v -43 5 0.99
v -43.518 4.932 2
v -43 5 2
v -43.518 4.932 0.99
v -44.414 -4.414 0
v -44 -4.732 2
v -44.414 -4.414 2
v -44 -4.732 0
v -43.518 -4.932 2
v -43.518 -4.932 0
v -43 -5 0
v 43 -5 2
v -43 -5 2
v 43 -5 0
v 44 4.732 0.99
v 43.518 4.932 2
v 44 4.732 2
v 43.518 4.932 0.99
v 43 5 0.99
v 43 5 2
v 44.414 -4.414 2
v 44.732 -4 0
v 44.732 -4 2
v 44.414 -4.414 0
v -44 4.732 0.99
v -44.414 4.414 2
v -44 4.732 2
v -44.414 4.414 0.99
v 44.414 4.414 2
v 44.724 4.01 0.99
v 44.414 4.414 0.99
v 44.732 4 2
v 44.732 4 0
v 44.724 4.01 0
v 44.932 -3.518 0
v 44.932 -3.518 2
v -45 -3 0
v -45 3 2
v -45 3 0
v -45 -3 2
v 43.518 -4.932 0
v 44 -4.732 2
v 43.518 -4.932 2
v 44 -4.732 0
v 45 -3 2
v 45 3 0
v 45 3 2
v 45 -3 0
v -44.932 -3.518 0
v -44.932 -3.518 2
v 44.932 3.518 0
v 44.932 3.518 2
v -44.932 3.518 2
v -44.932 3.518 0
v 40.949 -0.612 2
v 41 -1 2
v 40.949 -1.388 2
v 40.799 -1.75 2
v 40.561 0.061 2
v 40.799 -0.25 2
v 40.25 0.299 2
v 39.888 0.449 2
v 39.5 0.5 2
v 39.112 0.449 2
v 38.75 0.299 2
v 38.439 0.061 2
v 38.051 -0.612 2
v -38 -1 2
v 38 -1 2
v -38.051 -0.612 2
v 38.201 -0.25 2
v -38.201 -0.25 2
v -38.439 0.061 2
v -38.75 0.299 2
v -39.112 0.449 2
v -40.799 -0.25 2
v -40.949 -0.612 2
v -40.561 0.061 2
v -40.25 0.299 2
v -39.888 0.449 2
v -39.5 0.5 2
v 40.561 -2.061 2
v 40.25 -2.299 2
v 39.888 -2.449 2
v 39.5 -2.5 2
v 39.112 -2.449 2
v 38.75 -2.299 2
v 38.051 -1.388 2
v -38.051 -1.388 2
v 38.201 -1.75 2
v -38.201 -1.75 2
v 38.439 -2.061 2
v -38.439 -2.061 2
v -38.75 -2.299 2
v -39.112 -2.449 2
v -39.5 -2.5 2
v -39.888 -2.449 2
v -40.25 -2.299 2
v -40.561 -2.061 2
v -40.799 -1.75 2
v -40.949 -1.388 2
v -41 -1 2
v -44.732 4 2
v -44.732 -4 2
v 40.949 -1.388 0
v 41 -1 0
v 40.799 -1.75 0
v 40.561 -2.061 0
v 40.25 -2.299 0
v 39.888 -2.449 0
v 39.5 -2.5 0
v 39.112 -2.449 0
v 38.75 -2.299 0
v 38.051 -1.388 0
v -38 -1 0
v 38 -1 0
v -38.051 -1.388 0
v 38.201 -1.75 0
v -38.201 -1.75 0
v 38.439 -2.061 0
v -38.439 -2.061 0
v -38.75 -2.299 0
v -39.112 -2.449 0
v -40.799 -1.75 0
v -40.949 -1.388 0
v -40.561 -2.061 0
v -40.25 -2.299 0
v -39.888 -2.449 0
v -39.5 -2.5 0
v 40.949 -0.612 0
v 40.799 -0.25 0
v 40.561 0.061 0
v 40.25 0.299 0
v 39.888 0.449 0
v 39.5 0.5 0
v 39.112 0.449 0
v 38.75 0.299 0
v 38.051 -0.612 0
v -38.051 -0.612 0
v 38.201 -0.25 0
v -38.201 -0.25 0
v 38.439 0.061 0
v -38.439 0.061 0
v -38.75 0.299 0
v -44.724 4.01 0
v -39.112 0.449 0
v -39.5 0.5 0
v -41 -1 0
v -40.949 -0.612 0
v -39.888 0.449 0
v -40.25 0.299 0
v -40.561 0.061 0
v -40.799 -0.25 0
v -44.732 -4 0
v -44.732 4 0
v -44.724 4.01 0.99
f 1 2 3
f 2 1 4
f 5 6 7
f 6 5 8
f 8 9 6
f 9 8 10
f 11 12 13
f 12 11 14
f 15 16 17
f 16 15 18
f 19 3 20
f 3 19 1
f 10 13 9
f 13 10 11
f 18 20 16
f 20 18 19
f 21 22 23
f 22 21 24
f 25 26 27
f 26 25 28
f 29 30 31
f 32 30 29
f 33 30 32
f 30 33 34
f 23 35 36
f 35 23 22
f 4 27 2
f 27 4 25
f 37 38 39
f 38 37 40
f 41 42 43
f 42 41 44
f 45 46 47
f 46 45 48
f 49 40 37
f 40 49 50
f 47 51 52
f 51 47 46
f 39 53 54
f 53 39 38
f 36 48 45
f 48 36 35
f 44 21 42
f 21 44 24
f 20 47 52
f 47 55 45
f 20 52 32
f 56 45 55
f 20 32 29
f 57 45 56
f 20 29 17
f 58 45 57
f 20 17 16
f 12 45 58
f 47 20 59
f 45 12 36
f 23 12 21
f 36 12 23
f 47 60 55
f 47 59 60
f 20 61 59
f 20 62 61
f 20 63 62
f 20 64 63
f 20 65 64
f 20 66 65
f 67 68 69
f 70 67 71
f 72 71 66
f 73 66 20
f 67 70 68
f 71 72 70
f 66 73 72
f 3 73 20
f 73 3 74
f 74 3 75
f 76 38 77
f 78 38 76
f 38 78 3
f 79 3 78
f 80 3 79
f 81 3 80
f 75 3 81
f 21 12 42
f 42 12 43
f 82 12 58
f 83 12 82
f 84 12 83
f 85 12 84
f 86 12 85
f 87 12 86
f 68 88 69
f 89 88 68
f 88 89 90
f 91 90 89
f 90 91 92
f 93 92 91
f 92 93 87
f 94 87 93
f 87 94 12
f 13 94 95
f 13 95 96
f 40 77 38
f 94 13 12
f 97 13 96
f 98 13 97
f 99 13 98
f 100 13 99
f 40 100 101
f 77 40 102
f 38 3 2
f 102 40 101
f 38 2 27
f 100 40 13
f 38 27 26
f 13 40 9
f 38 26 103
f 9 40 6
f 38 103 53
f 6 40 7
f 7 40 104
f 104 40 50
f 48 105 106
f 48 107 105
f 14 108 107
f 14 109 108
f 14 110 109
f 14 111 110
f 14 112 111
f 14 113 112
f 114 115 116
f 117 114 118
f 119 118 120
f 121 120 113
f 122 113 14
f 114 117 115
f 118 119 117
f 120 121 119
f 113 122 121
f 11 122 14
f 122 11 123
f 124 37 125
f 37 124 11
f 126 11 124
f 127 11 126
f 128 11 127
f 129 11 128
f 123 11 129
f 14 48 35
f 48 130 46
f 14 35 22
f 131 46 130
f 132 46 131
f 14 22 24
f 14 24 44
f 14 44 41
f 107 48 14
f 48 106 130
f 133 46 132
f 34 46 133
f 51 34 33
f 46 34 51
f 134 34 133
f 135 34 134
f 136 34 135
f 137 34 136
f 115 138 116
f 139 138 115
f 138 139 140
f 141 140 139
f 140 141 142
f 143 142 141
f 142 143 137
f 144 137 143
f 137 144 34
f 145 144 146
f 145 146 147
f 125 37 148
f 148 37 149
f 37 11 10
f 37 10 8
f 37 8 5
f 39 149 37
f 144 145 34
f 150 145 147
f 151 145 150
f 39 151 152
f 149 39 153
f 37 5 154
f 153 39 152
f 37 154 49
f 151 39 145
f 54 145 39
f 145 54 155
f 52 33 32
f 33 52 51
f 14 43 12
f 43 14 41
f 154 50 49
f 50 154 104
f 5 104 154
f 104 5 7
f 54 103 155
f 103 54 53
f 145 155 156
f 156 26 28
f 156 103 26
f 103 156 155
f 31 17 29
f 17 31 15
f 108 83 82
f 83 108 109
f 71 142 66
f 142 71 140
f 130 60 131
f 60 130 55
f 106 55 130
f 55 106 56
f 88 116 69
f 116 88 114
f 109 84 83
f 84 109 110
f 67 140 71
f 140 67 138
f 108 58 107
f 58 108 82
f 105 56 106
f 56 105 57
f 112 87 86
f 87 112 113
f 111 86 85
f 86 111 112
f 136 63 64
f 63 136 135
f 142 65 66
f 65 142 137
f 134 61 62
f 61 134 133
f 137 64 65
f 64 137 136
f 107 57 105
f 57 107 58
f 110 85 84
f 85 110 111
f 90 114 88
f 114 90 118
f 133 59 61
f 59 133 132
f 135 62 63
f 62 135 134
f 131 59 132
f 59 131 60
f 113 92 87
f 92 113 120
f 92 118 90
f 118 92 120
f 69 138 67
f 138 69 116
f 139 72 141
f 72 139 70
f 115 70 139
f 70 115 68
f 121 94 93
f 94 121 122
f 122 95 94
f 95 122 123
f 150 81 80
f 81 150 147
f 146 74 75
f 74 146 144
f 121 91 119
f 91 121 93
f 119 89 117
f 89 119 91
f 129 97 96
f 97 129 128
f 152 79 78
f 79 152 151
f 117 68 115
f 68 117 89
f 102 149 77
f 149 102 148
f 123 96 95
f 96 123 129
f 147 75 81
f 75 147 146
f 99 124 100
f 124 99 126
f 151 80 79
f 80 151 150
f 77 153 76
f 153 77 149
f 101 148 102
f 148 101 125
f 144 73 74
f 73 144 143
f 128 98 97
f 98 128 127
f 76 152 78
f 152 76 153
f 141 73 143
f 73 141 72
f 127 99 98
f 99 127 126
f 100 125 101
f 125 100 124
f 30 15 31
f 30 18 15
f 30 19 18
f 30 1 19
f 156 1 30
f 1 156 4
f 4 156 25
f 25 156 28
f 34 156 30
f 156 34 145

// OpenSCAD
// file: ../OpenSCAD_Modules/cube_vround.scad
module cube_vround(
	size=[10,10,10],
	round_corners=[true,true,true,true],
	rounding=3,
	center_xy=false,
	center_z=false,
	attach=0,
	wall_attach=0,
	quality=2, //integer from 1 to infinity
)
{
	assert(len(size)==3);
	assert(len(round_corners)==4);
	assert(rounding>0);
	assert(rounding<=size[0]/2);
	assert(rounding<=size[1]/2);
	assert(quality>0);
	assert(attach>=0);
	assert(wall_attach>=0);
	height=size[2]+attach;
	cyl_r=rounding+wall_attach;
	cyl_mvx=size[0]/2-rounding;
	cyl_mvy=size[1]/2-rounding;
	cube_szx=size[0]/2;
	cube_szy=size[1]/2;
	cube_mvx=cube_szx/2+wall_attach;
	cube_mvy=cube_szy/2+wall_attach;
	translate([center_xy?0:cube_szx,center_xy?0:cube_szy,center_z?-attach/2:(size[2]-attach)/2])
		hull()
		{
			if(round_corners[0])
				translate([cyl_mvx,cyl_mvy])
					cylinder(r=cyl_r,h=height,$fn=12*quality,center=true);
			else
				translate([cube_mvx,cube_mvy])
					cube([cube_szx,cube_szy,height],center=true);
			if(round_corners[1])
				translate([cyl_mvx,-cyl_mvy])
					cylinder(r=cyl_r,h=height,$fn=12*quality,center=true);
			else
				translate([cube_mvx,-cube_mvy])
					cube([cube_szx,cube_szy,height],center=true);
			if(round_corners[2])
				translate([-cyl_mvx,-cyl_mvy])
					cylinder(r=cyl_r,h=height,$fn=12*quality,center=true);
			else
				translate([-cube_mvx,-cube_mvy])
					cube([cube_szx,cube_szy,height],center=true);
			if(round_corners[3])
				translate([-cyl_mvx,cyl_mvy])
					cylinder(r=cyl_r,h=height,$fn=12*quality,center=true);
			else
				translate([-cube_mvx,cube_mvy])
					cube([cube_szx,cube_szy,height],center=true);
		};
}

//example
cube_vround(round_corners=[true,false,true,false],
size=[10,20,6],
attach=0.1,
wall_attach=0.1,
rounding=3,
center_xy=true,center_z=false);
// main file
use <../OpenSCAD_Modules/cube_vround.scad>

module bracket()
{
	adapter_szx=90;
	adapter_holes_szx=79;
	bracket_sz=10;
	difference()
	{
		cube_vround(size=[adapter_szx,bracket_sz,2], round_corners=[true,true,true,true],
			rounding=2, center_xy=true, center_z=false, attach=0, wall_attach=0, quality=2);
		translate([adapter_holes_szx/2,-1,0])
			cylinder(d=3,h=30,center=true,$fn=24);
		translate([-adapter_holes_szx/2,-1,0])
			cylinder(d=3,h=30,center=true,$fn=24);
		translate([0,bracket_sz/2-0.5+0.01,0.5-0.01])
			cube([adapter_szx+1,1,1],center=true);
	}
}

bracket();
